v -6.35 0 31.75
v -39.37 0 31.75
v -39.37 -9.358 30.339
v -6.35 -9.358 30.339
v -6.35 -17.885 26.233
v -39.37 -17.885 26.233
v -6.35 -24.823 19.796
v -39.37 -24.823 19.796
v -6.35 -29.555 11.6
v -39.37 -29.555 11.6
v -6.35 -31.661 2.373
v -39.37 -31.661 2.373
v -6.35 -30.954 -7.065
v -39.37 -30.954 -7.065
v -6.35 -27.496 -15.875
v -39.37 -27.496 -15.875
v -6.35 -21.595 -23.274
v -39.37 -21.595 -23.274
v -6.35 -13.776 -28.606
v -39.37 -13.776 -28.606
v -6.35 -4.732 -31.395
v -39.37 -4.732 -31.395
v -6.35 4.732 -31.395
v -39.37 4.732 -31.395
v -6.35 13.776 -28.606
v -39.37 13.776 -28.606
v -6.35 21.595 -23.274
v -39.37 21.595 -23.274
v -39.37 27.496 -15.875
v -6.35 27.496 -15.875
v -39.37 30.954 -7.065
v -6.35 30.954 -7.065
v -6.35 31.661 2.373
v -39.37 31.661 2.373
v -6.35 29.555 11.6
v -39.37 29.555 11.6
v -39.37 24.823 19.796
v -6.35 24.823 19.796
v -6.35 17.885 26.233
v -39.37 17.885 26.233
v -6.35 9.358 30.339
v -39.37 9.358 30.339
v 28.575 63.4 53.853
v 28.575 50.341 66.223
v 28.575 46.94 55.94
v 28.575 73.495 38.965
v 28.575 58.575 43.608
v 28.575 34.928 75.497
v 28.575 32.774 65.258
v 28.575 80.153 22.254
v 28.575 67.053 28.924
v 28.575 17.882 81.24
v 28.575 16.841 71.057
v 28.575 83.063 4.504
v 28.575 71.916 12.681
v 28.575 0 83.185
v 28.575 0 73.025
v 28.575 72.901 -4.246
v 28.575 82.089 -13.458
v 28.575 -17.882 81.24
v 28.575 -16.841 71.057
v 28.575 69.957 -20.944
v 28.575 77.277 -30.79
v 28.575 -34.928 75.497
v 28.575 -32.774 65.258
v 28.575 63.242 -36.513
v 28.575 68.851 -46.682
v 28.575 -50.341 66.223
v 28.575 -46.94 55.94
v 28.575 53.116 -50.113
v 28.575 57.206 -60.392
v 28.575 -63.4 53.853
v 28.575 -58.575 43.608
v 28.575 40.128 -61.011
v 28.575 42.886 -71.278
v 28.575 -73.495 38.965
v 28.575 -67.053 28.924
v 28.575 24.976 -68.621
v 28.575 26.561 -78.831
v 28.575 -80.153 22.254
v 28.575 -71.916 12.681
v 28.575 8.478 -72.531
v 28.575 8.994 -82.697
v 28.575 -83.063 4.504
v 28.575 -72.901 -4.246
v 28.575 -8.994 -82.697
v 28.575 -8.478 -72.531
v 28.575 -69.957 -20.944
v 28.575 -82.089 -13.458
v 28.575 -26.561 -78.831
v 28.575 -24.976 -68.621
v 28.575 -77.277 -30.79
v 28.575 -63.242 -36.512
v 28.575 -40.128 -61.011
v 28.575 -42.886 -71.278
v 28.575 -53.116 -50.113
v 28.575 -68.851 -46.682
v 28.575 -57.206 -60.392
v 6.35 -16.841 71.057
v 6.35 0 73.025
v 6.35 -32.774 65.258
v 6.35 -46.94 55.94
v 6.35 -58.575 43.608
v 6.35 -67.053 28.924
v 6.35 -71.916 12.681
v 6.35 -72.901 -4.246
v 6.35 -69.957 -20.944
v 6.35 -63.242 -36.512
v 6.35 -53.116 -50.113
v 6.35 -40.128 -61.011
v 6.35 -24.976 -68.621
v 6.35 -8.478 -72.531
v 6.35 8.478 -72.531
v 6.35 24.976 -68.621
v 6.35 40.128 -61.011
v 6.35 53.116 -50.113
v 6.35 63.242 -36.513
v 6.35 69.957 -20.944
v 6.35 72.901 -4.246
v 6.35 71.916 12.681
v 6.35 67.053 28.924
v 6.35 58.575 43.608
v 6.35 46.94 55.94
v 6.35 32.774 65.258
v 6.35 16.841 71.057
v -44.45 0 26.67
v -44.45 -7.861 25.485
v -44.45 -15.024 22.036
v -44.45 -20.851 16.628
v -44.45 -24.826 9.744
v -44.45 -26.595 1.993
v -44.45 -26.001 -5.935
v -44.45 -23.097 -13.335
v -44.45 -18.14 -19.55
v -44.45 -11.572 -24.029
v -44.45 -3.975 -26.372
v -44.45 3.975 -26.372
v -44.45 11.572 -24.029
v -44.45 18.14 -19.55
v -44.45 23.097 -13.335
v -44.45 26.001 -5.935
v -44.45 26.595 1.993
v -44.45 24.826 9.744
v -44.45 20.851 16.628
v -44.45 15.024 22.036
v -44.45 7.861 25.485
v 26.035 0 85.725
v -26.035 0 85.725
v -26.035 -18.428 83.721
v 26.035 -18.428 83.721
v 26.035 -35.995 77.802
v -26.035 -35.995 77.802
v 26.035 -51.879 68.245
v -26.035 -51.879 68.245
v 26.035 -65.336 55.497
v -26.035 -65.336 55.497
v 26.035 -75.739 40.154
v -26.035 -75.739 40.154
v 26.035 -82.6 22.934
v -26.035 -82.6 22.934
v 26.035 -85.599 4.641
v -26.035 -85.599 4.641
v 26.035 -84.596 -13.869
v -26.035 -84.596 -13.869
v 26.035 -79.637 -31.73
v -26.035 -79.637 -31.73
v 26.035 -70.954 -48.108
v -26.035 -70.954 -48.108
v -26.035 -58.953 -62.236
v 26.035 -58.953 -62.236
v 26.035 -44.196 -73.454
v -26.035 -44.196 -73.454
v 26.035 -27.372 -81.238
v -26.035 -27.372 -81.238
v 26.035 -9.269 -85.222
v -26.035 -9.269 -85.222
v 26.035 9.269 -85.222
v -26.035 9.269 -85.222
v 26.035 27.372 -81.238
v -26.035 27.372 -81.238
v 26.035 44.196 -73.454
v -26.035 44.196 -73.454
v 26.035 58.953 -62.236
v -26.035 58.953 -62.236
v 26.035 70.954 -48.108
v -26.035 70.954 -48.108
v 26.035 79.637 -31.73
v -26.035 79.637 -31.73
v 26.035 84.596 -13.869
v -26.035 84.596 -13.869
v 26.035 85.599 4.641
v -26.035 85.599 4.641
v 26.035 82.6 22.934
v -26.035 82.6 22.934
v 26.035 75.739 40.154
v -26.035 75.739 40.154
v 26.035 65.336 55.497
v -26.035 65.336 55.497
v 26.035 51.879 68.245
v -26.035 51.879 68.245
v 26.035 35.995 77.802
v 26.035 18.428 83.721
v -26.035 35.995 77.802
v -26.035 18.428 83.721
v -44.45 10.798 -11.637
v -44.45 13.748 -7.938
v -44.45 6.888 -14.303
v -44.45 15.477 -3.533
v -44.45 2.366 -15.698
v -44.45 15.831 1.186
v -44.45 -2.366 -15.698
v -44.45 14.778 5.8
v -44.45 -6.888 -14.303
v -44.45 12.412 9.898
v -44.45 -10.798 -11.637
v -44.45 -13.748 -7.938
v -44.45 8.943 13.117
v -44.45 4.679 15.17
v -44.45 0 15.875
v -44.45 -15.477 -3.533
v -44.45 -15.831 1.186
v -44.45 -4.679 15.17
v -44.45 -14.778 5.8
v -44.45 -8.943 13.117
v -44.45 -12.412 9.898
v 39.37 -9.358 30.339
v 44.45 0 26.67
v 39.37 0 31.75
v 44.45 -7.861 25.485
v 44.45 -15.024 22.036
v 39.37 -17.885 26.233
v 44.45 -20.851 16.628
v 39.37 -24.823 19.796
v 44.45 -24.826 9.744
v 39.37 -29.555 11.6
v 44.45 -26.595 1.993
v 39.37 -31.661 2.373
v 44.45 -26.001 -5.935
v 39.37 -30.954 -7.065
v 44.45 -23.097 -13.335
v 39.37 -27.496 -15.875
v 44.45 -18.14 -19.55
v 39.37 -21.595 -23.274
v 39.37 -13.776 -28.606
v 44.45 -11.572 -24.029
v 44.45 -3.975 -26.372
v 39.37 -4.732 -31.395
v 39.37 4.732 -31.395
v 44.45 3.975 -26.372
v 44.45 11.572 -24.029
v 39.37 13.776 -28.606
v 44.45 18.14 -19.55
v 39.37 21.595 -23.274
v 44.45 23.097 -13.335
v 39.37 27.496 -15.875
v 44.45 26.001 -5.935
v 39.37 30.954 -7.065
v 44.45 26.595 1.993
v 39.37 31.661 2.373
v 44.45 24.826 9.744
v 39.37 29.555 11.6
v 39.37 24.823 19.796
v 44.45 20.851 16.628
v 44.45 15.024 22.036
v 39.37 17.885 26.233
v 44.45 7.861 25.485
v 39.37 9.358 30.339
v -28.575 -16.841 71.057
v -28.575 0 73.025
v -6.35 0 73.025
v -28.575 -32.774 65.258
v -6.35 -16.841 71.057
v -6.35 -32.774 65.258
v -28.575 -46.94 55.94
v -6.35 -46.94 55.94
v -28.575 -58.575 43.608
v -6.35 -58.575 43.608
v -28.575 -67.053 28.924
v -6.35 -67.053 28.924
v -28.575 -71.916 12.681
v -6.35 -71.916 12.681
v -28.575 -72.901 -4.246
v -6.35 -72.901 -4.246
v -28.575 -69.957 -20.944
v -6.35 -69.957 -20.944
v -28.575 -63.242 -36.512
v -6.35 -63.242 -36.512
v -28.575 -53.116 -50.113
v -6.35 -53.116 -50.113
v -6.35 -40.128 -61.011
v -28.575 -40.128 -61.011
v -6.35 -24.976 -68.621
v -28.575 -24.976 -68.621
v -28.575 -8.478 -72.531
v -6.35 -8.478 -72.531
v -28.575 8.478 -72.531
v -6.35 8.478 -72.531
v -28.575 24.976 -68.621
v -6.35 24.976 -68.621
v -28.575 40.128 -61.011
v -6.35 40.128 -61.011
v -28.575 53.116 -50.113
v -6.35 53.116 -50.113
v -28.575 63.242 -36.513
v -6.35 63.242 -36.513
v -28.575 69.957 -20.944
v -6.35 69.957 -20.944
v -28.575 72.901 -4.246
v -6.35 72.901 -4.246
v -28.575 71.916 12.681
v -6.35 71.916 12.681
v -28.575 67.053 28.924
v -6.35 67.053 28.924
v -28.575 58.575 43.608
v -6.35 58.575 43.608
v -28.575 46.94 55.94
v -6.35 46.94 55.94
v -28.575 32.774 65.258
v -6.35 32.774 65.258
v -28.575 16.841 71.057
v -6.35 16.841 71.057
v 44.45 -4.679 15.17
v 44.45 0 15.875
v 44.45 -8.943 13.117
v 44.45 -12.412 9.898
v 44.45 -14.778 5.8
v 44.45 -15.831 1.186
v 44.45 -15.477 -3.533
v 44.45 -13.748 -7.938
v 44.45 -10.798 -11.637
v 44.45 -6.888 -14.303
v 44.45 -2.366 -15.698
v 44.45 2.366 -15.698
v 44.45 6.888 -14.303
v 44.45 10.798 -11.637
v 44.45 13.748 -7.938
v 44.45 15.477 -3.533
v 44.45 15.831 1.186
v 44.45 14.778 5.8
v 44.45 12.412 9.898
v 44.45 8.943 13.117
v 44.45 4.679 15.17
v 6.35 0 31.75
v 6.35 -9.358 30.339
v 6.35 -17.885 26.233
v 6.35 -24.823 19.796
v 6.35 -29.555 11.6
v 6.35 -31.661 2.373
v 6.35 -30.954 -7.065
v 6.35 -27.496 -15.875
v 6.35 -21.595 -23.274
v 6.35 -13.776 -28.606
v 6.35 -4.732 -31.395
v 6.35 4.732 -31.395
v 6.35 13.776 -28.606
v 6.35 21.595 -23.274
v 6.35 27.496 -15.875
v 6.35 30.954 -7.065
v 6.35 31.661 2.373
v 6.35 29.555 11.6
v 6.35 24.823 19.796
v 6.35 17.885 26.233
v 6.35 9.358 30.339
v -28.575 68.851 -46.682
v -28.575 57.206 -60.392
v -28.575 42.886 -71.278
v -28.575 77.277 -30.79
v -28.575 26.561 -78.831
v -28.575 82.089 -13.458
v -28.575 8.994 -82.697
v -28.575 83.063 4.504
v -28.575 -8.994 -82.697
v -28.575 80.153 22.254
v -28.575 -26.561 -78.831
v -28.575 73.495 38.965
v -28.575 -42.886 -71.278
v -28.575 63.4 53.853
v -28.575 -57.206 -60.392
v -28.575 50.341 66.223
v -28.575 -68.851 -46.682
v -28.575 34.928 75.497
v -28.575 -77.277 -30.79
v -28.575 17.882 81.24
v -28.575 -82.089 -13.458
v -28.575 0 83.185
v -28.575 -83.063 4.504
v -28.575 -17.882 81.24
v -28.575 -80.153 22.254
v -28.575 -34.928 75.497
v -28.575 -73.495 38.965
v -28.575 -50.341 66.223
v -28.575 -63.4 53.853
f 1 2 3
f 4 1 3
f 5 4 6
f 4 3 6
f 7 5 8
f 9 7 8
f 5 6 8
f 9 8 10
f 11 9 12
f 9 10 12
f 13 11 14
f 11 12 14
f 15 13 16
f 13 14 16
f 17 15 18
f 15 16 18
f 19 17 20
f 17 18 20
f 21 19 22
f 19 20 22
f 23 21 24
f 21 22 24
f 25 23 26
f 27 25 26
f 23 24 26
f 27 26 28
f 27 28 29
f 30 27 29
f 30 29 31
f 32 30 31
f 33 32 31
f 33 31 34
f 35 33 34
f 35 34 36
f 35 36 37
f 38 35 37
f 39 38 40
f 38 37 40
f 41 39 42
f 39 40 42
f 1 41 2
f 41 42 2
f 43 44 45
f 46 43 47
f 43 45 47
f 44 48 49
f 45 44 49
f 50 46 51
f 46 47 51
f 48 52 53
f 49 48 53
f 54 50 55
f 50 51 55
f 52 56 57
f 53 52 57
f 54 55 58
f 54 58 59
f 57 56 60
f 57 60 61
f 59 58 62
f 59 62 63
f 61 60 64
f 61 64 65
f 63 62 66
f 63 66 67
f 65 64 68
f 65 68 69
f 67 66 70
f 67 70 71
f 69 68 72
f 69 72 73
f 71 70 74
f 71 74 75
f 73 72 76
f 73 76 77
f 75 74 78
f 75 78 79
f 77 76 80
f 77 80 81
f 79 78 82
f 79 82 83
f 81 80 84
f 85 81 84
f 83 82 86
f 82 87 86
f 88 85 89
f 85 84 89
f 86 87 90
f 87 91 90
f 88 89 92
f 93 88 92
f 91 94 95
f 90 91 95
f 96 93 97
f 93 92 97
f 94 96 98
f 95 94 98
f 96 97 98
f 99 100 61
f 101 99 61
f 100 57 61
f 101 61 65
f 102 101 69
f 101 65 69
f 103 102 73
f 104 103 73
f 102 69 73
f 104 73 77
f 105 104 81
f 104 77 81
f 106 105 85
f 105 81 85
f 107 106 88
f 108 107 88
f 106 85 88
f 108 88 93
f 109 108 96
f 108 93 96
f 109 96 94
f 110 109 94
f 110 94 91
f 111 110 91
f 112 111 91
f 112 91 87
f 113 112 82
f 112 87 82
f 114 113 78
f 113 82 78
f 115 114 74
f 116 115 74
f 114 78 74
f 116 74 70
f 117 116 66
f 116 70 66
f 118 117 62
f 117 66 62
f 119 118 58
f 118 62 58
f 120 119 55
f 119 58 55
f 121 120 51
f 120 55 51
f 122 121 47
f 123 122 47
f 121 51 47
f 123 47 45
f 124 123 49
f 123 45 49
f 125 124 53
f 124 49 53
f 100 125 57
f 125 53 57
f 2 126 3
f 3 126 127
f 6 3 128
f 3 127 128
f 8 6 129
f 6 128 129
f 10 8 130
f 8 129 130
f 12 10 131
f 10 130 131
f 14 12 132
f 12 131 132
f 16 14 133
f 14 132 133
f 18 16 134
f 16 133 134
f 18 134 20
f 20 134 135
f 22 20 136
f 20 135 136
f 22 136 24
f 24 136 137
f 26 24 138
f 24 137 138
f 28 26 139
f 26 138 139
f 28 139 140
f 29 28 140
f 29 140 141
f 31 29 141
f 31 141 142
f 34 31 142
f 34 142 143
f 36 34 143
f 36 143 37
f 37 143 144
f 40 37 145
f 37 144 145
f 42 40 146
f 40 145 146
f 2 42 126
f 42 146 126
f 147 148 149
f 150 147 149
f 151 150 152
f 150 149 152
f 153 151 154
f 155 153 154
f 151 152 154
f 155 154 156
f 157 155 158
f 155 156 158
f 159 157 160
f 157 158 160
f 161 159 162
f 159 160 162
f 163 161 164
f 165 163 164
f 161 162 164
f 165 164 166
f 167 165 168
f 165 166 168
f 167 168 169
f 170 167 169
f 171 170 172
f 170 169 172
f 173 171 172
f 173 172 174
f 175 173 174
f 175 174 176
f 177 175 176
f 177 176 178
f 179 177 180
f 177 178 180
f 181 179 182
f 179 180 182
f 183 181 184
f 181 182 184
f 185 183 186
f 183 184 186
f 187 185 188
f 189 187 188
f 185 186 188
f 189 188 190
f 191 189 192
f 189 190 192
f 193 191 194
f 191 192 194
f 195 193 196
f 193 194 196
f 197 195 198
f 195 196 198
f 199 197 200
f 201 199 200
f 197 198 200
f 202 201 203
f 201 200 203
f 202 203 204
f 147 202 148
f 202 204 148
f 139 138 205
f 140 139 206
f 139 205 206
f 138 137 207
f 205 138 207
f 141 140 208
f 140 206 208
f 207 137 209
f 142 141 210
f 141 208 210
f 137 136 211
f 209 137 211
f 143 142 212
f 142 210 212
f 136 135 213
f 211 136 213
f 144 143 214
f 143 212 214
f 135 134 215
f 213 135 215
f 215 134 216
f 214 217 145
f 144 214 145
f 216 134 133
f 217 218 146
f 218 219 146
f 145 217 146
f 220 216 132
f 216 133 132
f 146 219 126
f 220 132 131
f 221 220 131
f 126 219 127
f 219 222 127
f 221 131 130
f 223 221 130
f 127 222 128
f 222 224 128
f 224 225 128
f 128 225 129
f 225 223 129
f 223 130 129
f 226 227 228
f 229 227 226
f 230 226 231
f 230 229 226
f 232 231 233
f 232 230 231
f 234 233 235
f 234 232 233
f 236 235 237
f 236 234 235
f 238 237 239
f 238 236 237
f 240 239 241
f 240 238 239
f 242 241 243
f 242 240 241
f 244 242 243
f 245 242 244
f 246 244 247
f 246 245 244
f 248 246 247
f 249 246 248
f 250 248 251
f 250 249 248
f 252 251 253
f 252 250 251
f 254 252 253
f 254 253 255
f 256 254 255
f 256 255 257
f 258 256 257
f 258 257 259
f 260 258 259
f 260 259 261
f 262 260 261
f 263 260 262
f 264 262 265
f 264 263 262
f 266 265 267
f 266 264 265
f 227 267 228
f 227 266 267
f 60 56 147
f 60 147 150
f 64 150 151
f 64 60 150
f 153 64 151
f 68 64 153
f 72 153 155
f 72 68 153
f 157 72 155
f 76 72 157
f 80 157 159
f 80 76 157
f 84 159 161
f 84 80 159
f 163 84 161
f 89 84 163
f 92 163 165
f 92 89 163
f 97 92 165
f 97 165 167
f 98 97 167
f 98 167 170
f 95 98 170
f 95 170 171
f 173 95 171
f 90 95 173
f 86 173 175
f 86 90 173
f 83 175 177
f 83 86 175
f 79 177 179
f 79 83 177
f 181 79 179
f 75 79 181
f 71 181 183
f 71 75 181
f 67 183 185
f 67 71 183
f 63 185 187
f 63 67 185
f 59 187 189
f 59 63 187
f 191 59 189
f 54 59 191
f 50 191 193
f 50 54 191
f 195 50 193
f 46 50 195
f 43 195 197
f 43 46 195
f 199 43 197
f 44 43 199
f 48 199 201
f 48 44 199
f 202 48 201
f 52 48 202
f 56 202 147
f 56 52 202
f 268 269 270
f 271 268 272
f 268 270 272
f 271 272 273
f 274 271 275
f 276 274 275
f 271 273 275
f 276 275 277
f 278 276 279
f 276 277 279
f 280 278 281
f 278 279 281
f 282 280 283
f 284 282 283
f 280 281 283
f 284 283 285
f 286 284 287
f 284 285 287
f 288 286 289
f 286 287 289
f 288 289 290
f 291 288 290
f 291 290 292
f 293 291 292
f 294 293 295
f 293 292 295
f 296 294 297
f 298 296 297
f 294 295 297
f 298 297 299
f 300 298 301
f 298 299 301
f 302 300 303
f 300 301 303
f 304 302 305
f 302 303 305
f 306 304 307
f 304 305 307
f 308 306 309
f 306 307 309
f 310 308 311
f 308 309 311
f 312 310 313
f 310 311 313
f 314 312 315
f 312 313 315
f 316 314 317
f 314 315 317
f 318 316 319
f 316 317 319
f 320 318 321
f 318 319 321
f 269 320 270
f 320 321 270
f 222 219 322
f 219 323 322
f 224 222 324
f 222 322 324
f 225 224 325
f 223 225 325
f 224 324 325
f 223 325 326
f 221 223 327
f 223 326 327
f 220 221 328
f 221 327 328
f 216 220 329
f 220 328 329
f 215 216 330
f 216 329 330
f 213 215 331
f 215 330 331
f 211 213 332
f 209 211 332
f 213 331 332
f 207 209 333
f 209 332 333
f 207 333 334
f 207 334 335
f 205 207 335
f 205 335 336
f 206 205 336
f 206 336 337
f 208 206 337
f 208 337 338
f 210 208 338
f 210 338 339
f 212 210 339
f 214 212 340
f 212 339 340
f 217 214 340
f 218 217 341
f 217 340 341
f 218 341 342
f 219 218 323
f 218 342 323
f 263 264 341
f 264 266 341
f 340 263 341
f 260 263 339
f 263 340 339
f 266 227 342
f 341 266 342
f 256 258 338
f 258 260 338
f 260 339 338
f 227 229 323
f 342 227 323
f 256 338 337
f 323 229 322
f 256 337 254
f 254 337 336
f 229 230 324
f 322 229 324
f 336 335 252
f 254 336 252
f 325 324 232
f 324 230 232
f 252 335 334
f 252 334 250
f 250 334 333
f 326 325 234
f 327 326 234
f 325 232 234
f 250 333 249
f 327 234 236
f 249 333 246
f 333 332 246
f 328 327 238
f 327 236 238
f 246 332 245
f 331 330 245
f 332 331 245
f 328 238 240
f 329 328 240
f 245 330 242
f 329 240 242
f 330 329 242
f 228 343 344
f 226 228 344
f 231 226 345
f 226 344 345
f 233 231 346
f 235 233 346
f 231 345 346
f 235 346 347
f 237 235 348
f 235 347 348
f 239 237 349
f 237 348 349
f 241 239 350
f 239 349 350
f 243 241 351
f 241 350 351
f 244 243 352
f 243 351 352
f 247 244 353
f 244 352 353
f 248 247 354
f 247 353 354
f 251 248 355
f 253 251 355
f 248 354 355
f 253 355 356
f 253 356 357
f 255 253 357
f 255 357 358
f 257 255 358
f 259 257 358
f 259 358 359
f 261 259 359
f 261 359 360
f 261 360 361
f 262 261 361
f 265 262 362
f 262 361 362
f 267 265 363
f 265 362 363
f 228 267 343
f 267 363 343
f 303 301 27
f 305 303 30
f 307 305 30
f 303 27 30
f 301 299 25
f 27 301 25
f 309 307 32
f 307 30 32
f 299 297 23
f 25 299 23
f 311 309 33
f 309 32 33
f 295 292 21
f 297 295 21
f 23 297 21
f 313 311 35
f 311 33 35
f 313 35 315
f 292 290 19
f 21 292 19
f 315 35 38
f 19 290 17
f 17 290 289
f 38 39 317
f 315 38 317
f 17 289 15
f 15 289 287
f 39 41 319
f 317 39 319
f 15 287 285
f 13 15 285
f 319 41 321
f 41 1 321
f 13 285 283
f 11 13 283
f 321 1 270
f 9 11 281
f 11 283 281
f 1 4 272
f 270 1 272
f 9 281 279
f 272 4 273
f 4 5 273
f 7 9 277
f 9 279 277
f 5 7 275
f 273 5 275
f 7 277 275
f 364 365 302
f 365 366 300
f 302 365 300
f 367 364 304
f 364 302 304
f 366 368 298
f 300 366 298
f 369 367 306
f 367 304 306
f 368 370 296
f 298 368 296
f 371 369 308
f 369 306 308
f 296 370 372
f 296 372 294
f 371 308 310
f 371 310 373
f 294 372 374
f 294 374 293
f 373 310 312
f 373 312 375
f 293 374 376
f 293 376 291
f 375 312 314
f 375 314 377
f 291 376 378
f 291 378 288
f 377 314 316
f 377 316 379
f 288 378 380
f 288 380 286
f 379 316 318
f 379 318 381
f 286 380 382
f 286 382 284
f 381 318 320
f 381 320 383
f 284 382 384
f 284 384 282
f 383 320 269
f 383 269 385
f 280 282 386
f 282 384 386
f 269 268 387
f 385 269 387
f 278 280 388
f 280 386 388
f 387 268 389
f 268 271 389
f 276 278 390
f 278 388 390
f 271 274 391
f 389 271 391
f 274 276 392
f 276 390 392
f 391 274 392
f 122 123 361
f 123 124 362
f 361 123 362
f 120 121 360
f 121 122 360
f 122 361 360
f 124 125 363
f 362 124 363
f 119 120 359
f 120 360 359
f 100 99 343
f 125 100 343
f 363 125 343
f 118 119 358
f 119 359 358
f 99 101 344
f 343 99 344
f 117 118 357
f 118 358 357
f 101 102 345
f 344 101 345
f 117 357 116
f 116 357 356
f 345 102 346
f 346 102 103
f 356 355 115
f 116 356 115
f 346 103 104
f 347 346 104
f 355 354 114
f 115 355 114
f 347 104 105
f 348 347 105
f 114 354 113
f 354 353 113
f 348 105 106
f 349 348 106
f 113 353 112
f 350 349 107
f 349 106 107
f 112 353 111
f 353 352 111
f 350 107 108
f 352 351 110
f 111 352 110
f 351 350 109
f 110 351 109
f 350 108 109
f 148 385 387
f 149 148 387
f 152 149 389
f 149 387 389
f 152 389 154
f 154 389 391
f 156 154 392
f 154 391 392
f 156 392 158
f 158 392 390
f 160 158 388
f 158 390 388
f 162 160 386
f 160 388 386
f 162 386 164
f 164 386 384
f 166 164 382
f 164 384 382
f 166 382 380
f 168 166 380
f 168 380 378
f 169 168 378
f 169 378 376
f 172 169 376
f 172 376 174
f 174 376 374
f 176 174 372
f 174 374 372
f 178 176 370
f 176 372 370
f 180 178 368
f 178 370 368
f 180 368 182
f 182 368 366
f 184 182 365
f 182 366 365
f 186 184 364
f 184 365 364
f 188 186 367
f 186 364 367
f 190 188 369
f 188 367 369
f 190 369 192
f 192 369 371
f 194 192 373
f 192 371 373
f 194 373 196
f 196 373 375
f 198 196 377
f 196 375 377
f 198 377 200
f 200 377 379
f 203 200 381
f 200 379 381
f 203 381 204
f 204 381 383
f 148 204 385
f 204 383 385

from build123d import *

# Parameters (mm, degrees)
F2_SIZE = 2.54
F3_SIZE = 5.08


with BuildPart() as f1:
    # F0 (on Front) → F1 (revolve)
    with BuildSketch(Plane.XZ):
        Polygon((28.575, 85.725), (-28.575, 85.725), (-28.575, 73.025), (-6.35, 73.025), (-6.35, 31.75), (-44.45, 31.75), (-44.45, 15.875), (44.45, 15.875), (44.45, 31.75), (6.35, 31.75), (6.35, 73.025), (28.575, 73.025), align=None)
    revolve(axis=Axis((-1.587497, 0, 0), (1, 0, 0)))

    # F2
    f2_edges = [f1.edges().sort_by_distance(p)[0] for p in [
        (-28.575, 0, -85.725),
        (28.575, 0, -85.725),
    ]]
    chamfer(f2_edges, length=F2_SIZE)

    # F3
    f3_edges = [f1.edges().sort_by_distance(p)[0] for p in [
        (44.45, 0, -31.75),
        (-44.45, 0, -31.75),
    ]]
    chamfer(f3_edges, length=F3_SIZE)


solid = f1.part
